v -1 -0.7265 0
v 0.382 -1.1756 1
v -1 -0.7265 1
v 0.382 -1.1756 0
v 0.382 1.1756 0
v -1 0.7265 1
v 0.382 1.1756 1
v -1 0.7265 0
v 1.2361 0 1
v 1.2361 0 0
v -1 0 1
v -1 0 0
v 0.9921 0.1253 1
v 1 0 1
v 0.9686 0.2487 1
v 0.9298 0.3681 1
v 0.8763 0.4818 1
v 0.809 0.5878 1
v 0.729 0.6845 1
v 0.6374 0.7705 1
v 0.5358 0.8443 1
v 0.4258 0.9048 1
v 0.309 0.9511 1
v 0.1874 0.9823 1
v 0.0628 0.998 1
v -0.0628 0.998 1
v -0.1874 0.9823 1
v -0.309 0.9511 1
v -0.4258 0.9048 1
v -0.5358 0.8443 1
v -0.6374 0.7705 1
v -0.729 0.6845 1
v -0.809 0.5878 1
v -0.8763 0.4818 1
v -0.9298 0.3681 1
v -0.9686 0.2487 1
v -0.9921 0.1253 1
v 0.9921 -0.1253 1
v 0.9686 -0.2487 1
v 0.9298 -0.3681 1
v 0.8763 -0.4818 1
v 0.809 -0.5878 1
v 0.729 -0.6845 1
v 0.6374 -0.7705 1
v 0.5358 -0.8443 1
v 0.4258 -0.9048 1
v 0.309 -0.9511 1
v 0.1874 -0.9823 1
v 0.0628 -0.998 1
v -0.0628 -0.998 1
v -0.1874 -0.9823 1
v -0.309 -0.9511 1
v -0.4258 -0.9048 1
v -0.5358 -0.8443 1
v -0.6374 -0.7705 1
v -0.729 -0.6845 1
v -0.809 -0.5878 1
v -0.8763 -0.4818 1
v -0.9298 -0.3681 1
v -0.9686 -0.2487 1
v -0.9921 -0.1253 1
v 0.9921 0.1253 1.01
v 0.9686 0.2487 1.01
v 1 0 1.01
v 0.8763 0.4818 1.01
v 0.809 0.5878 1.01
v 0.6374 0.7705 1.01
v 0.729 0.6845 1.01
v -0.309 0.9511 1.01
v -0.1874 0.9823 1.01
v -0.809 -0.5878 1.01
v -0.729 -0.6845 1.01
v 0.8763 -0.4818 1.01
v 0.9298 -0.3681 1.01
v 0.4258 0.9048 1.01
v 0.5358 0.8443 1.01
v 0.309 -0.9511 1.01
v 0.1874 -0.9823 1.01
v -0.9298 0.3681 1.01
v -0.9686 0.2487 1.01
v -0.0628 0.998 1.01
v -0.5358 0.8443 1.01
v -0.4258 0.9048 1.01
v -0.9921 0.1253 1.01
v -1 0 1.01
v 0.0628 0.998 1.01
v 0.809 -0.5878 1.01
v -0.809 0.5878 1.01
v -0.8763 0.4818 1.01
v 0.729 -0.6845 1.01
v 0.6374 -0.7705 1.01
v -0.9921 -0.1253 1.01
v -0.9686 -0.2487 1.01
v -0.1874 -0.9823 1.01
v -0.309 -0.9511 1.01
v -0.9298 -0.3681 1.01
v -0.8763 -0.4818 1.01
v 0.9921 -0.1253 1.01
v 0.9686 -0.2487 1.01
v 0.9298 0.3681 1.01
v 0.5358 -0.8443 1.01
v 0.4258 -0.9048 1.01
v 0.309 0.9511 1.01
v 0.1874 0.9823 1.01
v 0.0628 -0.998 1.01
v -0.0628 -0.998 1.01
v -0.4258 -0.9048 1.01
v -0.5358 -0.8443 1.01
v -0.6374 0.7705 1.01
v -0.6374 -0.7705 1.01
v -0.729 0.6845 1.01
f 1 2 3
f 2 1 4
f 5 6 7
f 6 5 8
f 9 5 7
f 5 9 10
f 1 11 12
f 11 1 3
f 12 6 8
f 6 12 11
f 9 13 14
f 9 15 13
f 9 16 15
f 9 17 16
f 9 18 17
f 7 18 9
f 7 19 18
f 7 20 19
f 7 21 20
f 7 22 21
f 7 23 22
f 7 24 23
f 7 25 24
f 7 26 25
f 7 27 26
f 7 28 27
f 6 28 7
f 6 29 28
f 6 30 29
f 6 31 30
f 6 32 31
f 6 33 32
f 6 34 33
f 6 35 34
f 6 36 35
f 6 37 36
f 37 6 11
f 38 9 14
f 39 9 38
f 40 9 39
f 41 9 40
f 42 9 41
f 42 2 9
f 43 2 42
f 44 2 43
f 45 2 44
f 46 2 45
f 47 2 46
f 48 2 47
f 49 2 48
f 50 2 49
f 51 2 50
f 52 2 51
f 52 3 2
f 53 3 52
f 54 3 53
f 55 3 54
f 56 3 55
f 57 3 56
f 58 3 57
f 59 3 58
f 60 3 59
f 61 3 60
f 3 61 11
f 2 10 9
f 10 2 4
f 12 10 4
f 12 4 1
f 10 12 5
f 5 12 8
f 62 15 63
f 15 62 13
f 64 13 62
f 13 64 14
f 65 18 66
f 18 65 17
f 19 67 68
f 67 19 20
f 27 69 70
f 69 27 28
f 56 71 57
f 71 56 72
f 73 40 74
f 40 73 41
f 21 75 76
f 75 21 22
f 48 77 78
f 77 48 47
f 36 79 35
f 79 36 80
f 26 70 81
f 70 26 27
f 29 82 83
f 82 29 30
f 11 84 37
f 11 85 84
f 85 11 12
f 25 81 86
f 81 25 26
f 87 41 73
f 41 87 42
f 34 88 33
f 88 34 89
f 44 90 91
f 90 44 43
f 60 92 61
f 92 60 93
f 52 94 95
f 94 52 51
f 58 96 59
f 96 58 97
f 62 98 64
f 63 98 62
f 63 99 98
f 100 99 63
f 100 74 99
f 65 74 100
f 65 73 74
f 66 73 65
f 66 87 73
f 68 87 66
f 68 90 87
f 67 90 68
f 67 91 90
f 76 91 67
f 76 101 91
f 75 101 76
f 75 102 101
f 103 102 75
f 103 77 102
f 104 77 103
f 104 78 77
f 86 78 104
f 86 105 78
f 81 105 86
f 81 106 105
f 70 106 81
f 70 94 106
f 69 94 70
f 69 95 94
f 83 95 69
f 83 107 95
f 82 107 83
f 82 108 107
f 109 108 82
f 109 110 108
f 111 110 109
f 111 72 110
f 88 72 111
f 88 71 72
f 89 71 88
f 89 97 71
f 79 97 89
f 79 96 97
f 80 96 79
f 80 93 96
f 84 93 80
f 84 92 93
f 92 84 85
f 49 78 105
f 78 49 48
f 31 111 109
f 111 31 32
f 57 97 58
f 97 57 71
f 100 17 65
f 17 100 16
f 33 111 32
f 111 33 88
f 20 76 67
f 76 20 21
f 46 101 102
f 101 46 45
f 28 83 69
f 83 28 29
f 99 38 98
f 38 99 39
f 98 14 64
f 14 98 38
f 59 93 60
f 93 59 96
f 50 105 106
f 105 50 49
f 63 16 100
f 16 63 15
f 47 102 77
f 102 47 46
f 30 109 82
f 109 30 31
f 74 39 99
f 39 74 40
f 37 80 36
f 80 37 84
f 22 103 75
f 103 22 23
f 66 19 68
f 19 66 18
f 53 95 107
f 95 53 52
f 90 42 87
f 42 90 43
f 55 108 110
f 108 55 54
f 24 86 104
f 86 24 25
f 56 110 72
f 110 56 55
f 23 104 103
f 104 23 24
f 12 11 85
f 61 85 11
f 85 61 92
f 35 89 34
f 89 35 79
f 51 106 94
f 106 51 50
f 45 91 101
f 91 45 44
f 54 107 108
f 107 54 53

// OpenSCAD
// file: get_fragments_from_r.scad
GRID_FINE = 0.000001;
M_PI = 3.14159;

/*	Returns the number of subdivision of a whole circle, given radius and
	the three special variables $fn, $fs and $fa
*/
function get_fragments_from_r(r, fn, fs, fa) =
    r < GRID_FINE ? 3
    : fn > 0 ? (fn >= 3 ? floor(fn) : 3)
    : ceil(max(min(360.0 / fa, r*2*M_PI / fs), 5));
// main file
use <get_fragments_from_r.scad>

color("yellow") cylinder_outer(1, 1, 1);
color("blue", 0.5) cylinder(1.01, 1, 1, $fn=50);

module cylinder_outer(height, radius1, radius2)
{
    fn = get_fragments_from_r(max(radius1, radius2), $fn, $fs, $fa);
    fudge = 1/cos(180/fn);
    cylinder(height,radius1*fudge,radius2*fudge,$fn=fn);
}
